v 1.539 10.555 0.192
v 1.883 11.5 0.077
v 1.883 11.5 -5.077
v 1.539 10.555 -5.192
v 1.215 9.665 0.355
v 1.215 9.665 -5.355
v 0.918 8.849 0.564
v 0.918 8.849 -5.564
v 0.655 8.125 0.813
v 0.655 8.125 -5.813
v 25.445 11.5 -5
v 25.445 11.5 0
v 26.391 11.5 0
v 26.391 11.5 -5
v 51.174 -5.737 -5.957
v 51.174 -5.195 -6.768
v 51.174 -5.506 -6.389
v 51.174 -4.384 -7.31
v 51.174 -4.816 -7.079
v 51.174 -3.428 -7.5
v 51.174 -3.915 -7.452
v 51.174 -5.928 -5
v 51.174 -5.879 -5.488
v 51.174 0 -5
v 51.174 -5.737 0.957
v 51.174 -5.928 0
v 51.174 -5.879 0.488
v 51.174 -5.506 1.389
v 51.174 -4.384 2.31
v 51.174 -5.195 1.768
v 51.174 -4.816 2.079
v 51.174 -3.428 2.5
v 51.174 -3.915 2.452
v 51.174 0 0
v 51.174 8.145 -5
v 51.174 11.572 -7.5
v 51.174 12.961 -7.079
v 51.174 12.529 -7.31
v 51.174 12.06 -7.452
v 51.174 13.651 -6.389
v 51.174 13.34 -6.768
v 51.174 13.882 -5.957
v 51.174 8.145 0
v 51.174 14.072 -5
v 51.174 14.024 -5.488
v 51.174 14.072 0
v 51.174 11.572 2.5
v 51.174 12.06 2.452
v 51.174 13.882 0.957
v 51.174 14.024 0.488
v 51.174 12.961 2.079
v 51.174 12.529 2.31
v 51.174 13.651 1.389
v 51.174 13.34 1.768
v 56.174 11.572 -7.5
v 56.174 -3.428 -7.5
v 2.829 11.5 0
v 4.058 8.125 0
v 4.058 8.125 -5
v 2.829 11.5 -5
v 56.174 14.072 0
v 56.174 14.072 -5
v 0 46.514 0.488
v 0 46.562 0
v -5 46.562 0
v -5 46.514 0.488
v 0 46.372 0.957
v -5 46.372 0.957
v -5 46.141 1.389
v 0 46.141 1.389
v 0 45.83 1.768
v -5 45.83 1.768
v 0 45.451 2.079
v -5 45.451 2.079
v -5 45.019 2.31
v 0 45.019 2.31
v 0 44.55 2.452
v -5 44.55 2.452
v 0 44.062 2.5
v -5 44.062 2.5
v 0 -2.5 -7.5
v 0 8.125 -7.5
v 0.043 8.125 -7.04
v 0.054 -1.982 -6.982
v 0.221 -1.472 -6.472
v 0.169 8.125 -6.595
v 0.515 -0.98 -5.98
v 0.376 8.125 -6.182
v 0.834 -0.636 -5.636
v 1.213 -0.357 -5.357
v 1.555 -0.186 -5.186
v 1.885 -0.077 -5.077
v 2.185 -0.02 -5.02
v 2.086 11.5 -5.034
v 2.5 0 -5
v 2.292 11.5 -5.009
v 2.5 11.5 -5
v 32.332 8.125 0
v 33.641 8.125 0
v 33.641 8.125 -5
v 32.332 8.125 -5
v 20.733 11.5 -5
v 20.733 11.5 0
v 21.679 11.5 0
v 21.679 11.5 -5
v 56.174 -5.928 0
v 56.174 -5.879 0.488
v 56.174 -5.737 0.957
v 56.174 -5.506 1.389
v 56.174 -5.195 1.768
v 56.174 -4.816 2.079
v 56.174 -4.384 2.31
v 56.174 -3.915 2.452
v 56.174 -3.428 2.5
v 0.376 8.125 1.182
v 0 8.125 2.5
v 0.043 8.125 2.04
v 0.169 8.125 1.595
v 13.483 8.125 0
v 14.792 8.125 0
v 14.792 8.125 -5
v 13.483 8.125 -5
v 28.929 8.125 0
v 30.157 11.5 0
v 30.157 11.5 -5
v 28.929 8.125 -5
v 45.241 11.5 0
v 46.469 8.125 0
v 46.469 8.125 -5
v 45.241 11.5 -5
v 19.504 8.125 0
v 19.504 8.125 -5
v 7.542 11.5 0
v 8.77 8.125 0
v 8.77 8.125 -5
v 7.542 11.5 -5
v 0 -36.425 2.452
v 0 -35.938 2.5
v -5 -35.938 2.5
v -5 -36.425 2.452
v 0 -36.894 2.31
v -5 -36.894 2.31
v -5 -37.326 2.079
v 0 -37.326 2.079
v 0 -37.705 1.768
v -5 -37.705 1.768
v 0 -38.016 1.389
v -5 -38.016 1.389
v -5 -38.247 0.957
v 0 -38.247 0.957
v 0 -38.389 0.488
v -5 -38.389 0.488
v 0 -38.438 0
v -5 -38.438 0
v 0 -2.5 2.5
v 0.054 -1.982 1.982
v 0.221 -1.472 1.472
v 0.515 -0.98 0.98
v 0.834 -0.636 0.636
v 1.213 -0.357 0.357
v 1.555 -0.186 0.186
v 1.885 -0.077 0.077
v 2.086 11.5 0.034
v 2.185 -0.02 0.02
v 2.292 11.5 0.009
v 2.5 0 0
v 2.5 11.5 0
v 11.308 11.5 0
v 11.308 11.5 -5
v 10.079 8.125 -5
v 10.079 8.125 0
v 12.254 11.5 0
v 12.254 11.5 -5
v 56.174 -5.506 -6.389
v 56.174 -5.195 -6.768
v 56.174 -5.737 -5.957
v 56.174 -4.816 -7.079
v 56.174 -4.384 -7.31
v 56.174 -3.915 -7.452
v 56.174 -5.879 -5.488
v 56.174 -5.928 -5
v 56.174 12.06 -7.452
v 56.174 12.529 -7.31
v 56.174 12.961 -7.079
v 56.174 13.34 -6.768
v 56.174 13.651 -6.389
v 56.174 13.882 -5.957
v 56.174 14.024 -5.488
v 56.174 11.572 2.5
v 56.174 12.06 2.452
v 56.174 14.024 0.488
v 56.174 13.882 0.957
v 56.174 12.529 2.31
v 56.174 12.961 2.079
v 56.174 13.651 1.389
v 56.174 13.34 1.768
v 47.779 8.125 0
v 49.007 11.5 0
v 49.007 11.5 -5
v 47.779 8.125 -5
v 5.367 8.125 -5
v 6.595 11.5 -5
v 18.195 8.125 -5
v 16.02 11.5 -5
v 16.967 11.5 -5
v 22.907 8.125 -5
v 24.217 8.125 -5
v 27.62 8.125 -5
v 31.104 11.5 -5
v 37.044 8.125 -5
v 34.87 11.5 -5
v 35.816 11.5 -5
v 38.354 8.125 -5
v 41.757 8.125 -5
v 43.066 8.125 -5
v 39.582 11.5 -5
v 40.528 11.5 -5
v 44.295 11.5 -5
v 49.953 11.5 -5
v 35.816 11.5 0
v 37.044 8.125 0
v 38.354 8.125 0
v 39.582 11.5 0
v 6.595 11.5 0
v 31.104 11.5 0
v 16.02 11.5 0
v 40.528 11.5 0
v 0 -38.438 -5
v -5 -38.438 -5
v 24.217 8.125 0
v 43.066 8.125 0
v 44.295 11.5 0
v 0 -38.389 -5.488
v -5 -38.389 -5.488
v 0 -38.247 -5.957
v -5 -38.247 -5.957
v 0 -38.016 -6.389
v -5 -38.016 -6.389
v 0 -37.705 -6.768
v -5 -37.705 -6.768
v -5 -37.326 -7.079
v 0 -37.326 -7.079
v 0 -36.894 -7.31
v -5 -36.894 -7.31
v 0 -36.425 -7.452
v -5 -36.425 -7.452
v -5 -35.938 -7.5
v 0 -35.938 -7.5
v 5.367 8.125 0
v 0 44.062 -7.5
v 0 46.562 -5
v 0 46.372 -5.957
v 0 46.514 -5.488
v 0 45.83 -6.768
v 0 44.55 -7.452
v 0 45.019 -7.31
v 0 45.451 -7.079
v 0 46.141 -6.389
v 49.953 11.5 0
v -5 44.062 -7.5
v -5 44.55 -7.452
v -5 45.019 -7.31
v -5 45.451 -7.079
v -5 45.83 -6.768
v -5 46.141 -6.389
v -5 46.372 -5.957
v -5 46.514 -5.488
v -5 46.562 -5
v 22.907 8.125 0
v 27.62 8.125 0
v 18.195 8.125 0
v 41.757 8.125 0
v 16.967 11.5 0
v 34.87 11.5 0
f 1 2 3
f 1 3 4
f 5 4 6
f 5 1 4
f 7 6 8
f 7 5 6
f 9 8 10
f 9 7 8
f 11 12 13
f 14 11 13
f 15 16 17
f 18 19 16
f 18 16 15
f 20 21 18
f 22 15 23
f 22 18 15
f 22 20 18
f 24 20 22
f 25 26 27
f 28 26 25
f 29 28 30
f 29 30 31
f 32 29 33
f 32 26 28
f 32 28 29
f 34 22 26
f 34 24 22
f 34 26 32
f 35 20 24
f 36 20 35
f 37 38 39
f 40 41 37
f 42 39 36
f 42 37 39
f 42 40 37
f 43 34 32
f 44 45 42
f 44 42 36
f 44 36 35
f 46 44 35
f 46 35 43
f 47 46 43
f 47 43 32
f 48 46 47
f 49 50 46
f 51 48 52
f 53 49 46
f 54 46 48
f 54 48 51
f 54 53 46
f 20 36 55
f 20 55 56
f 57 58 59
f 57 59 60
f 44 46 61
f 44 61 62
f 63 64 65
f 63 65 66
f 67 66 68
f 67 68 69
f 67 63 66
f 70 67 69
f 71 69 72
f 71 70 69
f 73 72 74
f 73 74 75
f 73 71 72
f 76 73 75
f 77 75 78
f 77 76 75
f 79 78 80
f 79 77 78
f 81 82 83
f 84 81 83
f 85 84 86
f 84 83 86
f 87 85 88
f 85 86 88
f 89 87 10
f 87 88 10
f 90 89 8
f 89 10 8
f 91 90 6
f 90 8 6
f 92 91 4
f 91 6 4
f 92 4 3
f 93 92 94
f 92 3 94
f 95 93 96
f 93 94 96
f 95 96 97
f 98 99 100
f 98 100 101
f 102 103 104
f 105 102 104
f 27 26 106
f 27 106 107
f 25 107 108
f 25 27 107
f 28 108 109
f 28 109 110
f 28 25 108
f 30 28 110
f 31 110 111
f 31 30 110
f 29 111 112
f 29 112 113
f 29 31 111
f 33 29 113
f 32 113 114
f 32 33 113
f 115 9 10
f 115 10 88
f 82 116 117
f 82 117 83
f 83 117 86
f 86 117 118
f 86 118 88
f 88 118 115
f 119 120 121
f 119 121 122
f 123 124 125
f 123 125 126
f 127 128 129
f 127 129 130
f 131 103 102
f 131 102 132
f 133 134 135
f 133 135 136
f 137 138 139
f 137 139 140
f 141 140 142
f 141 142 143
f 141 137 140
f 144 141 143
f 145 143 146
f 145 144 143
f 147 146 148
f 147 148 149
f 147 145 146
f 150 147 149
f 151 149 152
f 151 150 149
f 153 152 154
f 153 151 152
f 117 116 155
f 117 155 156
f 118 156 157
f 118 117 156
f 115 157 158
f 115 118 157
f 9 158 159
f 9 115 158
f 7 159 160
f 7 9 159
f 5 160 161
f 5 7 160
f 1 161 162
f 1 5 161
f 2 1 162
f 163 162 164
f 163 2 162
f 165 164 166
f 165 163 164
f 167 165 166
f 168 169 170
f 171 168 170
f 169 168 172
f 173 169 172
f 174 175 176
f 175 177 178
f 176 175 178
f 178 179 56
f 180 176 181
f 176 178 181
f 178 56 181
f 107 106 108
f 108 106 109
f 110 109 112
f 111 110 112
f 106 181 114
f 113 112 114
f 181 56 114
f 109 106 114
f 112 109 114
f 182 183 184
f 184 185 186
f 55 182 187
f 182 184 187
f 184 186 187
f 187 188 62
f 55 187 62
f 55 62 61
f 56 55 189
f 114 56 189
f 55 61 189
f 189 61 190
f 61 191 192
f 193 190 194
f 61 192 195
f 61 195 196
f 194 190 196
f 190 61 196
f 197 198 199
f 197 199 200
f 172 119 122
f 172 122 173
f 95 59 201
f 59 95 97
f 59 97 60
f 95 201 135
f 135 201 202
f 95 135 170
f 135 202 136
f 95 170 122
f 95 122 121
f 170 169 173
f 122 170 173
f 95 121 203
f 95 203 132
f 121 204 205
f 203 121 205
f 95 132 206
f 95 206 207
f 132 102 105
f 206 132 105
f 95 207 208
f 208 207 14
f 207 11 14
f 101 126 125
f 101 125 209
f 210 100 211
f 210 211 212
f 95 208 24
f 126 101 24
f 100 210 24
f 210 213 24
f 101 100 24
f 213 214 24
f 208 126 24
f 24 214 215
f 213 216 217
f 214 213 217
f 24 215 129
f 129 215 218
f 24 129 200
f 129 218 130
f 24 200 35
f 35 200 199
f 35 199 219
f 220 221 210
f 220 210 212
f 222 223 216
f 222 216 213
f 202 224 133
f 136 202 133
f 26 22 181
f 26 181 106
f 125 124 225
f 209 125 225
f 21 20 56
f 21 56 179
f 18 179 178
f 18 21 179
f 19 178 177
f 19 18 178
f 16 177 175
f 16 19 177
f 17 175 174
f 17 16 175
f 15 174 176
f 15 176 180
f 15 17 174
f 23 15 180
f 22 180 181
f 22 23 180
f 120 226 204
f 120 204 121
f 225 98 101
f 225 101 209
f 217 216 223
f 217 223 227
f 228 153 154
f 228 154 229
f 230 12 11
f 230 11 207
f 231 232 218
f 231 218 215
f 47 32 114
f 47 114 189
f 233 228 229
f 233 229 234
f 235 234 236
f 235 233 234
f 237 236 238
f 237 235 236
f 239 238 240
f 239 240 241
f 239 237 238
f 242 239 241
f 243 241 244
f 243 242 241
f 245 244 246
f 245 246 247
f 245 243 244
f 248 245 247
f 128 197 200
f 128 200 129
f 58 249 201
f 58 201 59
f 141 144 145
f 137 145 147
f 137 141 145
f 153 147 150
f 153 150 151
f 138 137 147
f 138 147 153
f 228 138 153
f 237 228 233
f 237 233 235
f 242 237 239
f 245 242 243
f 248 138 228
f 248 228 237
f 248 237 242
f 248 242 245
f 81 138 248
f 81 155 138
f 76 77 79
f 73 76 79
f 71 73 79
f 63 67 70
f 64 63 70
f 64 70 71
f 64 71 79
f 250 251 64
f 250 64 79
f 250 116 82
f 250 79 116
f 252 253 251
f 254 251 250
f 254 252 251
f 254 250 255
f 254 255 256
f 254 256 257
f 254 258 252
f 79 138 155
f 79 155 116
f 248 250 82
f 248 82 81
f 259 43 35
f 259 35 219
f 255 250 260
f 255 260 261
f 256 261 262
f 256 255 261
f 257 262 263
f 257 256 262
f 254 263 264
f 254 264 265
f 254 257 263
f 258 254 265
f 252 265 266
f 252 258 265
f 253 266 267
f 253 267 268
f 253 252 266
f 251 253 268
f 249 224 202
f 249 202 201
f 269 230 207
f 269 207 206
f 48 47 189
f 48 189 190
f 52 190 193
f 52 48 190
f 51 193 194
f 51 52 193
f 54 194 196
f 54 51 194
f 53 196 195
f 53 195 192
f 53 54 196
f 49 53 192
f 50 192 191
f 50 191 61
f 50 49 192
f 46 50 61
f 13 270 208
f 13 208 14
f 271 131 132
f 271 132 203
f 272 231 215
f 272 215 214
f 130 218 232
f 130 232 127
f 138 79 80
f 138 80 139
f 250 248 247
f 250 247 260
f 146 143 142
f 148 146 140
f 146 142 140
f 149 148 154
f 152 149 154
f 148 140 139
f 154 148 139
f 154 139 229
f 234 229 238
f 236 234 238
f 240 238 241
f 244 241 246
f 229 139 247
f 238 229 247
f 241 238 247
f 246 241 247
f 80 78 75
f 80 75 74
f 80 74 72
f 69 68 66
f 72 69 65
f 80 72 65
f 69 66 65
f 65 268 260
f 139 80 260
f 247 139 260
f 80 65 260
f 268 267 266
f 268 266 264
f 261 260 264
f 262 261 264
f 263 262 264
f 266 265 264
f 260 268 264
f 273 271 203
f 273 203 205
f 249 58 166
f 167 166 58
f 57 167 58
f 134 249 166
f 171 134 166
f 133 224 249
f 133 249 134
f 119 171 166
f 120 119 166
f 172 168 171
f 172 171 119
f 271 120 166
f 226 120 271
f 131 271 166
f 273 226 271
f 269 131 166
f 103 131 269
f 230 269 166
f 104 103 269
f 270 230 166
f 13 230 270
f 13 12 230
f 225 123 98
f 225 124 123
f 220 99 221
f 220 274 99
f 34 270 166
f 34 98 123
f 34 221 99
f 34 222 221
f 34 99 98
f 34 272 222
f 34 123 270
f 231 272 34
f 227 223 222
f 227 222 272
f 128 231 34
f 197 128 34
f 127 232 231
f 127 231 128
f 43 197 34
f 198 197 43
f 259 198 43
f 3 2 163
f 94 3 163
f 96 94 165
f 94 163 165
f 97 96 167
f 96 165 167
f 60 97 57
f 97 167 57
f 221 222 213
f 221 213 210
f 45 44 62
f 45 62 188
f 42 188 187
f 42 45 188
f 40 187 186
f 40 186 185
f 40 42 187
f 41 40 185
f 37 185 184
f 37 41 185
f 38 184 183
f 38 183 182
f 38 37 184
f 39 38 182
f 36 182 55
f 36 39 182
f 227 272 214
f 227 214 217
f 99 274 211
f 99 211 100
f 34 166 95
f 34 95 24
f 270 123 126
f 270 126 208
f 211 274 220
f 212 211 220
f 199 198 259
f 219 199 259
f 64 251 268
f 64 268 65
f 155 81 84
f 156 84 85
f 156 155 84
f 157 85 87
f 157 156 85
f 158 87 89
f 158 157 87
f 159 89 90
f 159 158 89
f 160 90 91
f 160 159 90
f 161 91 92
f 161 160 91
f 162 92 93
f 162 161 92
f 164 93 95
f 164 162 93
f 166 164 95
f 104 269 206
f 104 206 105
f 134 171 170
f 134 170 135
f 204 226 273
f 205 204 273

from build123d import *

# Parameters (mm, degrees)
BLANKSKE_W                   = 100
BLANKSKE_H                   = 11.5
BLANK_DEPTH                  = 5
TOOTHCUTSIM_DEPTH            = 101.783183121
TEETHCUTS_COUNT              = 22
TEETHCUTS_PITCH              = 4.712388975
BOSS_EXTRU_1_DEPTH           = 5
BOSS_EXTRU_2_DEPTH           = 5
CONG_2_R                     = 2.5
CONG_3_R                     = 2.5
CONG_4_R                     = 2.5
ENL_V_MAT_EXTRU_1_DEPTH      = 116.139334748
ENL_V_MAT_EXTRU_1_DEPTH_BACK = 116.139334748
ESQUISSE4_W                  = 53.825648792
ESQUISSE4_H                  = 17.774257486
BOSS_EXTRU_3_DEPTH           = 5


with BuildPart() as part:
    # BlankSke → Blank (new body)
    with BuildSketch(Plane.XY):
        with Locations((50, 5.75)):
            Rectangle(BLANKSKE_W, BLANKSKE_H)
    extrude(amount=-BLANK_DEPTH)

    # TooCutSkeSim → ToothCutSim (cut, through all)
    with BuildSketch(Plane.XY):
        Polygon((0.654653055, 8.125), (-0.654653055, 8.125), (-1.892297439, 11.5254), (1.892297439, 11.5254), align=None)
    toothcutsim = extrude(amount=-TOOTHCUTSIM_DEPTH, mode=Mode.SUBTRACT)

    # TeethCuts: ToothCutSim ×22
    with Locations(*[(i * TEETHCUTS_PITCH, 0, 0) for i in range(1, TEETHCUTS_COUNT)]):
        add(toothcutsim, mode=Mode.SUBTRACT)

    # Esquisse1 → Boss.-Extru.1 (add)
    with BuildSketch(Plane(origin=(100, 0, 0), x_dir=(0, 0, -1), z_dir=(1, 0, 0))):
        with BuildLine():
            Line((5, 12.18326915), (0, 12.18326915))
            ThreePointArc((0, 12.18326915), (-2.121320344, 11.304589494), (-3, 9.18326915))
            Line((-3, 9.18326915), (-3, 0))
            ThreePointArc((-3, 0), (-2.121320344, -2.121320344), (0, -3))
            Line((0, -3), (5, -3))
            ThreePointArc((5, -3), (7.121320344, -2.121320344), (8, 0))
            Line((8, 0), (8, 9.18326915))
            ThreePointArc((8, 9.18326915), (7.121320344, 11.304589494), (5, 12.18326915))
        make_face()
    extrude(amount=BOSS_EXTRU_1_DEPTH)

    # Esquisse2 → Boss.-Extru.2 (add)
    with BuildSketch(Plane.ZY):
        with BuildLine():
            Line((-5, 46.5625), (0, 46.5625))
            ThreePointArc((0, 46.5625), (1.767766953, 45.830266953), (2.5, 44.0625))
            Line((2.5, 44.0625), (2.5, -35.9375))
            ThreePointArc((2.5, -35.9375), (1.767766953, -37.705266953), (0, -38.4375))
            Line((0, -38.4375), (-5, -38.4375))
            ThreePointArc((-5, -38.4375), (-6.767766953, -37.705266953), (-7.5, -35.9375))
            Line((-7.5, -35.9375), (-7.5, 44.0625))
            ThreePointArc((-7.5, 44.0625), (-6.767766953, 45.830266953), (-5, 46.5625))
        make_face()
    extrude(amount=BOSS_EXTRU_2_DEPTH)

    # Congé2
    cong_2_edges = [part.edges().sort_by_distance(p)[0] for p in [
        (0, 4.0625, -5),
    ]]
    fillet(cong_2_edges, radius=CONG_2_R - 0.0001)  # a hair under: the kernel refuses the full size

    # Congé3
    cong_3_edges = [part.edges().sort_by_distance(p)[0] for p in [
        (0, 4.0625, 0),
    ]]
    fillet(cong_3_edges, radius=CONG_3_R - 0.0001)  # a hair under: the kernel refuses the full size

    # Congé4
    cong_4_edges = [part.edges().sort_by_distance(p)[0] for p in [
        (0, 0, -2.5),
    ]]
    fillet(cong_4_edges, radius=CONG_4_R)

    # Esquisse4 → Enlèv. mat.-Extru.1 (cut, two sides: drawn at the far end of the back side and taken through both)
    with BuildSketch(Plane(origin=(0, 0, -5), x_dir=(-1, 0, 0), z_dir=(0, 0, -1)).offset(-ENL_V_MAT_EXTRU_1_DEPTH_BACK)):
        with Locations((-78.087175604, 5.887128743)):
            Rectangle(ESQUISSE4_W, ESQUISSE4_H)
    extrude(amount=ENL_V_MAT_EXTRU_1_DEPTH + ENL_V_MAT_EXTRU_1_DEPTH_BACK, mode=Mode.SUBTRACT)

    # Esquisse5 → Boss.-Extru.3 (add)
    with BuildSketch(Plane(origin=(51.174351208, 0, 0), x_dir=(0, 0, -1), z_dir=(1, 0, 0))):
        with BuildLine():
            Line((0, 14.07249321), (5, 14.07249321))
            ThreePointArc((5, 14.07249321), (6.767766953, 13.340260163), (7.5, 11.57249321))
            Line((7.5, 11.57249321), (7.5, -3.42750679))
            ThreePointArc((7.5, -3.42750679), (6.767766953, -5.195273743), (5, -5.92750679))
            Line((5, -5.92750679), (0, -5.92750679))
            ThreePointArc((0, -5.92750679), (-1.767766953, -5.195273743), (-2.5, -3.42750679))
            Line((-2.5, -3.42750679), (-2.5, 11.57249321))
            ThreePointArc((-2.5, 11.57249321), (-1.767766953, 13.340260163), (0, 14.07249321))
        make_face()
    extrude(amount=BOSS_EXTRU_3_DEPTH)


solid = part.part
